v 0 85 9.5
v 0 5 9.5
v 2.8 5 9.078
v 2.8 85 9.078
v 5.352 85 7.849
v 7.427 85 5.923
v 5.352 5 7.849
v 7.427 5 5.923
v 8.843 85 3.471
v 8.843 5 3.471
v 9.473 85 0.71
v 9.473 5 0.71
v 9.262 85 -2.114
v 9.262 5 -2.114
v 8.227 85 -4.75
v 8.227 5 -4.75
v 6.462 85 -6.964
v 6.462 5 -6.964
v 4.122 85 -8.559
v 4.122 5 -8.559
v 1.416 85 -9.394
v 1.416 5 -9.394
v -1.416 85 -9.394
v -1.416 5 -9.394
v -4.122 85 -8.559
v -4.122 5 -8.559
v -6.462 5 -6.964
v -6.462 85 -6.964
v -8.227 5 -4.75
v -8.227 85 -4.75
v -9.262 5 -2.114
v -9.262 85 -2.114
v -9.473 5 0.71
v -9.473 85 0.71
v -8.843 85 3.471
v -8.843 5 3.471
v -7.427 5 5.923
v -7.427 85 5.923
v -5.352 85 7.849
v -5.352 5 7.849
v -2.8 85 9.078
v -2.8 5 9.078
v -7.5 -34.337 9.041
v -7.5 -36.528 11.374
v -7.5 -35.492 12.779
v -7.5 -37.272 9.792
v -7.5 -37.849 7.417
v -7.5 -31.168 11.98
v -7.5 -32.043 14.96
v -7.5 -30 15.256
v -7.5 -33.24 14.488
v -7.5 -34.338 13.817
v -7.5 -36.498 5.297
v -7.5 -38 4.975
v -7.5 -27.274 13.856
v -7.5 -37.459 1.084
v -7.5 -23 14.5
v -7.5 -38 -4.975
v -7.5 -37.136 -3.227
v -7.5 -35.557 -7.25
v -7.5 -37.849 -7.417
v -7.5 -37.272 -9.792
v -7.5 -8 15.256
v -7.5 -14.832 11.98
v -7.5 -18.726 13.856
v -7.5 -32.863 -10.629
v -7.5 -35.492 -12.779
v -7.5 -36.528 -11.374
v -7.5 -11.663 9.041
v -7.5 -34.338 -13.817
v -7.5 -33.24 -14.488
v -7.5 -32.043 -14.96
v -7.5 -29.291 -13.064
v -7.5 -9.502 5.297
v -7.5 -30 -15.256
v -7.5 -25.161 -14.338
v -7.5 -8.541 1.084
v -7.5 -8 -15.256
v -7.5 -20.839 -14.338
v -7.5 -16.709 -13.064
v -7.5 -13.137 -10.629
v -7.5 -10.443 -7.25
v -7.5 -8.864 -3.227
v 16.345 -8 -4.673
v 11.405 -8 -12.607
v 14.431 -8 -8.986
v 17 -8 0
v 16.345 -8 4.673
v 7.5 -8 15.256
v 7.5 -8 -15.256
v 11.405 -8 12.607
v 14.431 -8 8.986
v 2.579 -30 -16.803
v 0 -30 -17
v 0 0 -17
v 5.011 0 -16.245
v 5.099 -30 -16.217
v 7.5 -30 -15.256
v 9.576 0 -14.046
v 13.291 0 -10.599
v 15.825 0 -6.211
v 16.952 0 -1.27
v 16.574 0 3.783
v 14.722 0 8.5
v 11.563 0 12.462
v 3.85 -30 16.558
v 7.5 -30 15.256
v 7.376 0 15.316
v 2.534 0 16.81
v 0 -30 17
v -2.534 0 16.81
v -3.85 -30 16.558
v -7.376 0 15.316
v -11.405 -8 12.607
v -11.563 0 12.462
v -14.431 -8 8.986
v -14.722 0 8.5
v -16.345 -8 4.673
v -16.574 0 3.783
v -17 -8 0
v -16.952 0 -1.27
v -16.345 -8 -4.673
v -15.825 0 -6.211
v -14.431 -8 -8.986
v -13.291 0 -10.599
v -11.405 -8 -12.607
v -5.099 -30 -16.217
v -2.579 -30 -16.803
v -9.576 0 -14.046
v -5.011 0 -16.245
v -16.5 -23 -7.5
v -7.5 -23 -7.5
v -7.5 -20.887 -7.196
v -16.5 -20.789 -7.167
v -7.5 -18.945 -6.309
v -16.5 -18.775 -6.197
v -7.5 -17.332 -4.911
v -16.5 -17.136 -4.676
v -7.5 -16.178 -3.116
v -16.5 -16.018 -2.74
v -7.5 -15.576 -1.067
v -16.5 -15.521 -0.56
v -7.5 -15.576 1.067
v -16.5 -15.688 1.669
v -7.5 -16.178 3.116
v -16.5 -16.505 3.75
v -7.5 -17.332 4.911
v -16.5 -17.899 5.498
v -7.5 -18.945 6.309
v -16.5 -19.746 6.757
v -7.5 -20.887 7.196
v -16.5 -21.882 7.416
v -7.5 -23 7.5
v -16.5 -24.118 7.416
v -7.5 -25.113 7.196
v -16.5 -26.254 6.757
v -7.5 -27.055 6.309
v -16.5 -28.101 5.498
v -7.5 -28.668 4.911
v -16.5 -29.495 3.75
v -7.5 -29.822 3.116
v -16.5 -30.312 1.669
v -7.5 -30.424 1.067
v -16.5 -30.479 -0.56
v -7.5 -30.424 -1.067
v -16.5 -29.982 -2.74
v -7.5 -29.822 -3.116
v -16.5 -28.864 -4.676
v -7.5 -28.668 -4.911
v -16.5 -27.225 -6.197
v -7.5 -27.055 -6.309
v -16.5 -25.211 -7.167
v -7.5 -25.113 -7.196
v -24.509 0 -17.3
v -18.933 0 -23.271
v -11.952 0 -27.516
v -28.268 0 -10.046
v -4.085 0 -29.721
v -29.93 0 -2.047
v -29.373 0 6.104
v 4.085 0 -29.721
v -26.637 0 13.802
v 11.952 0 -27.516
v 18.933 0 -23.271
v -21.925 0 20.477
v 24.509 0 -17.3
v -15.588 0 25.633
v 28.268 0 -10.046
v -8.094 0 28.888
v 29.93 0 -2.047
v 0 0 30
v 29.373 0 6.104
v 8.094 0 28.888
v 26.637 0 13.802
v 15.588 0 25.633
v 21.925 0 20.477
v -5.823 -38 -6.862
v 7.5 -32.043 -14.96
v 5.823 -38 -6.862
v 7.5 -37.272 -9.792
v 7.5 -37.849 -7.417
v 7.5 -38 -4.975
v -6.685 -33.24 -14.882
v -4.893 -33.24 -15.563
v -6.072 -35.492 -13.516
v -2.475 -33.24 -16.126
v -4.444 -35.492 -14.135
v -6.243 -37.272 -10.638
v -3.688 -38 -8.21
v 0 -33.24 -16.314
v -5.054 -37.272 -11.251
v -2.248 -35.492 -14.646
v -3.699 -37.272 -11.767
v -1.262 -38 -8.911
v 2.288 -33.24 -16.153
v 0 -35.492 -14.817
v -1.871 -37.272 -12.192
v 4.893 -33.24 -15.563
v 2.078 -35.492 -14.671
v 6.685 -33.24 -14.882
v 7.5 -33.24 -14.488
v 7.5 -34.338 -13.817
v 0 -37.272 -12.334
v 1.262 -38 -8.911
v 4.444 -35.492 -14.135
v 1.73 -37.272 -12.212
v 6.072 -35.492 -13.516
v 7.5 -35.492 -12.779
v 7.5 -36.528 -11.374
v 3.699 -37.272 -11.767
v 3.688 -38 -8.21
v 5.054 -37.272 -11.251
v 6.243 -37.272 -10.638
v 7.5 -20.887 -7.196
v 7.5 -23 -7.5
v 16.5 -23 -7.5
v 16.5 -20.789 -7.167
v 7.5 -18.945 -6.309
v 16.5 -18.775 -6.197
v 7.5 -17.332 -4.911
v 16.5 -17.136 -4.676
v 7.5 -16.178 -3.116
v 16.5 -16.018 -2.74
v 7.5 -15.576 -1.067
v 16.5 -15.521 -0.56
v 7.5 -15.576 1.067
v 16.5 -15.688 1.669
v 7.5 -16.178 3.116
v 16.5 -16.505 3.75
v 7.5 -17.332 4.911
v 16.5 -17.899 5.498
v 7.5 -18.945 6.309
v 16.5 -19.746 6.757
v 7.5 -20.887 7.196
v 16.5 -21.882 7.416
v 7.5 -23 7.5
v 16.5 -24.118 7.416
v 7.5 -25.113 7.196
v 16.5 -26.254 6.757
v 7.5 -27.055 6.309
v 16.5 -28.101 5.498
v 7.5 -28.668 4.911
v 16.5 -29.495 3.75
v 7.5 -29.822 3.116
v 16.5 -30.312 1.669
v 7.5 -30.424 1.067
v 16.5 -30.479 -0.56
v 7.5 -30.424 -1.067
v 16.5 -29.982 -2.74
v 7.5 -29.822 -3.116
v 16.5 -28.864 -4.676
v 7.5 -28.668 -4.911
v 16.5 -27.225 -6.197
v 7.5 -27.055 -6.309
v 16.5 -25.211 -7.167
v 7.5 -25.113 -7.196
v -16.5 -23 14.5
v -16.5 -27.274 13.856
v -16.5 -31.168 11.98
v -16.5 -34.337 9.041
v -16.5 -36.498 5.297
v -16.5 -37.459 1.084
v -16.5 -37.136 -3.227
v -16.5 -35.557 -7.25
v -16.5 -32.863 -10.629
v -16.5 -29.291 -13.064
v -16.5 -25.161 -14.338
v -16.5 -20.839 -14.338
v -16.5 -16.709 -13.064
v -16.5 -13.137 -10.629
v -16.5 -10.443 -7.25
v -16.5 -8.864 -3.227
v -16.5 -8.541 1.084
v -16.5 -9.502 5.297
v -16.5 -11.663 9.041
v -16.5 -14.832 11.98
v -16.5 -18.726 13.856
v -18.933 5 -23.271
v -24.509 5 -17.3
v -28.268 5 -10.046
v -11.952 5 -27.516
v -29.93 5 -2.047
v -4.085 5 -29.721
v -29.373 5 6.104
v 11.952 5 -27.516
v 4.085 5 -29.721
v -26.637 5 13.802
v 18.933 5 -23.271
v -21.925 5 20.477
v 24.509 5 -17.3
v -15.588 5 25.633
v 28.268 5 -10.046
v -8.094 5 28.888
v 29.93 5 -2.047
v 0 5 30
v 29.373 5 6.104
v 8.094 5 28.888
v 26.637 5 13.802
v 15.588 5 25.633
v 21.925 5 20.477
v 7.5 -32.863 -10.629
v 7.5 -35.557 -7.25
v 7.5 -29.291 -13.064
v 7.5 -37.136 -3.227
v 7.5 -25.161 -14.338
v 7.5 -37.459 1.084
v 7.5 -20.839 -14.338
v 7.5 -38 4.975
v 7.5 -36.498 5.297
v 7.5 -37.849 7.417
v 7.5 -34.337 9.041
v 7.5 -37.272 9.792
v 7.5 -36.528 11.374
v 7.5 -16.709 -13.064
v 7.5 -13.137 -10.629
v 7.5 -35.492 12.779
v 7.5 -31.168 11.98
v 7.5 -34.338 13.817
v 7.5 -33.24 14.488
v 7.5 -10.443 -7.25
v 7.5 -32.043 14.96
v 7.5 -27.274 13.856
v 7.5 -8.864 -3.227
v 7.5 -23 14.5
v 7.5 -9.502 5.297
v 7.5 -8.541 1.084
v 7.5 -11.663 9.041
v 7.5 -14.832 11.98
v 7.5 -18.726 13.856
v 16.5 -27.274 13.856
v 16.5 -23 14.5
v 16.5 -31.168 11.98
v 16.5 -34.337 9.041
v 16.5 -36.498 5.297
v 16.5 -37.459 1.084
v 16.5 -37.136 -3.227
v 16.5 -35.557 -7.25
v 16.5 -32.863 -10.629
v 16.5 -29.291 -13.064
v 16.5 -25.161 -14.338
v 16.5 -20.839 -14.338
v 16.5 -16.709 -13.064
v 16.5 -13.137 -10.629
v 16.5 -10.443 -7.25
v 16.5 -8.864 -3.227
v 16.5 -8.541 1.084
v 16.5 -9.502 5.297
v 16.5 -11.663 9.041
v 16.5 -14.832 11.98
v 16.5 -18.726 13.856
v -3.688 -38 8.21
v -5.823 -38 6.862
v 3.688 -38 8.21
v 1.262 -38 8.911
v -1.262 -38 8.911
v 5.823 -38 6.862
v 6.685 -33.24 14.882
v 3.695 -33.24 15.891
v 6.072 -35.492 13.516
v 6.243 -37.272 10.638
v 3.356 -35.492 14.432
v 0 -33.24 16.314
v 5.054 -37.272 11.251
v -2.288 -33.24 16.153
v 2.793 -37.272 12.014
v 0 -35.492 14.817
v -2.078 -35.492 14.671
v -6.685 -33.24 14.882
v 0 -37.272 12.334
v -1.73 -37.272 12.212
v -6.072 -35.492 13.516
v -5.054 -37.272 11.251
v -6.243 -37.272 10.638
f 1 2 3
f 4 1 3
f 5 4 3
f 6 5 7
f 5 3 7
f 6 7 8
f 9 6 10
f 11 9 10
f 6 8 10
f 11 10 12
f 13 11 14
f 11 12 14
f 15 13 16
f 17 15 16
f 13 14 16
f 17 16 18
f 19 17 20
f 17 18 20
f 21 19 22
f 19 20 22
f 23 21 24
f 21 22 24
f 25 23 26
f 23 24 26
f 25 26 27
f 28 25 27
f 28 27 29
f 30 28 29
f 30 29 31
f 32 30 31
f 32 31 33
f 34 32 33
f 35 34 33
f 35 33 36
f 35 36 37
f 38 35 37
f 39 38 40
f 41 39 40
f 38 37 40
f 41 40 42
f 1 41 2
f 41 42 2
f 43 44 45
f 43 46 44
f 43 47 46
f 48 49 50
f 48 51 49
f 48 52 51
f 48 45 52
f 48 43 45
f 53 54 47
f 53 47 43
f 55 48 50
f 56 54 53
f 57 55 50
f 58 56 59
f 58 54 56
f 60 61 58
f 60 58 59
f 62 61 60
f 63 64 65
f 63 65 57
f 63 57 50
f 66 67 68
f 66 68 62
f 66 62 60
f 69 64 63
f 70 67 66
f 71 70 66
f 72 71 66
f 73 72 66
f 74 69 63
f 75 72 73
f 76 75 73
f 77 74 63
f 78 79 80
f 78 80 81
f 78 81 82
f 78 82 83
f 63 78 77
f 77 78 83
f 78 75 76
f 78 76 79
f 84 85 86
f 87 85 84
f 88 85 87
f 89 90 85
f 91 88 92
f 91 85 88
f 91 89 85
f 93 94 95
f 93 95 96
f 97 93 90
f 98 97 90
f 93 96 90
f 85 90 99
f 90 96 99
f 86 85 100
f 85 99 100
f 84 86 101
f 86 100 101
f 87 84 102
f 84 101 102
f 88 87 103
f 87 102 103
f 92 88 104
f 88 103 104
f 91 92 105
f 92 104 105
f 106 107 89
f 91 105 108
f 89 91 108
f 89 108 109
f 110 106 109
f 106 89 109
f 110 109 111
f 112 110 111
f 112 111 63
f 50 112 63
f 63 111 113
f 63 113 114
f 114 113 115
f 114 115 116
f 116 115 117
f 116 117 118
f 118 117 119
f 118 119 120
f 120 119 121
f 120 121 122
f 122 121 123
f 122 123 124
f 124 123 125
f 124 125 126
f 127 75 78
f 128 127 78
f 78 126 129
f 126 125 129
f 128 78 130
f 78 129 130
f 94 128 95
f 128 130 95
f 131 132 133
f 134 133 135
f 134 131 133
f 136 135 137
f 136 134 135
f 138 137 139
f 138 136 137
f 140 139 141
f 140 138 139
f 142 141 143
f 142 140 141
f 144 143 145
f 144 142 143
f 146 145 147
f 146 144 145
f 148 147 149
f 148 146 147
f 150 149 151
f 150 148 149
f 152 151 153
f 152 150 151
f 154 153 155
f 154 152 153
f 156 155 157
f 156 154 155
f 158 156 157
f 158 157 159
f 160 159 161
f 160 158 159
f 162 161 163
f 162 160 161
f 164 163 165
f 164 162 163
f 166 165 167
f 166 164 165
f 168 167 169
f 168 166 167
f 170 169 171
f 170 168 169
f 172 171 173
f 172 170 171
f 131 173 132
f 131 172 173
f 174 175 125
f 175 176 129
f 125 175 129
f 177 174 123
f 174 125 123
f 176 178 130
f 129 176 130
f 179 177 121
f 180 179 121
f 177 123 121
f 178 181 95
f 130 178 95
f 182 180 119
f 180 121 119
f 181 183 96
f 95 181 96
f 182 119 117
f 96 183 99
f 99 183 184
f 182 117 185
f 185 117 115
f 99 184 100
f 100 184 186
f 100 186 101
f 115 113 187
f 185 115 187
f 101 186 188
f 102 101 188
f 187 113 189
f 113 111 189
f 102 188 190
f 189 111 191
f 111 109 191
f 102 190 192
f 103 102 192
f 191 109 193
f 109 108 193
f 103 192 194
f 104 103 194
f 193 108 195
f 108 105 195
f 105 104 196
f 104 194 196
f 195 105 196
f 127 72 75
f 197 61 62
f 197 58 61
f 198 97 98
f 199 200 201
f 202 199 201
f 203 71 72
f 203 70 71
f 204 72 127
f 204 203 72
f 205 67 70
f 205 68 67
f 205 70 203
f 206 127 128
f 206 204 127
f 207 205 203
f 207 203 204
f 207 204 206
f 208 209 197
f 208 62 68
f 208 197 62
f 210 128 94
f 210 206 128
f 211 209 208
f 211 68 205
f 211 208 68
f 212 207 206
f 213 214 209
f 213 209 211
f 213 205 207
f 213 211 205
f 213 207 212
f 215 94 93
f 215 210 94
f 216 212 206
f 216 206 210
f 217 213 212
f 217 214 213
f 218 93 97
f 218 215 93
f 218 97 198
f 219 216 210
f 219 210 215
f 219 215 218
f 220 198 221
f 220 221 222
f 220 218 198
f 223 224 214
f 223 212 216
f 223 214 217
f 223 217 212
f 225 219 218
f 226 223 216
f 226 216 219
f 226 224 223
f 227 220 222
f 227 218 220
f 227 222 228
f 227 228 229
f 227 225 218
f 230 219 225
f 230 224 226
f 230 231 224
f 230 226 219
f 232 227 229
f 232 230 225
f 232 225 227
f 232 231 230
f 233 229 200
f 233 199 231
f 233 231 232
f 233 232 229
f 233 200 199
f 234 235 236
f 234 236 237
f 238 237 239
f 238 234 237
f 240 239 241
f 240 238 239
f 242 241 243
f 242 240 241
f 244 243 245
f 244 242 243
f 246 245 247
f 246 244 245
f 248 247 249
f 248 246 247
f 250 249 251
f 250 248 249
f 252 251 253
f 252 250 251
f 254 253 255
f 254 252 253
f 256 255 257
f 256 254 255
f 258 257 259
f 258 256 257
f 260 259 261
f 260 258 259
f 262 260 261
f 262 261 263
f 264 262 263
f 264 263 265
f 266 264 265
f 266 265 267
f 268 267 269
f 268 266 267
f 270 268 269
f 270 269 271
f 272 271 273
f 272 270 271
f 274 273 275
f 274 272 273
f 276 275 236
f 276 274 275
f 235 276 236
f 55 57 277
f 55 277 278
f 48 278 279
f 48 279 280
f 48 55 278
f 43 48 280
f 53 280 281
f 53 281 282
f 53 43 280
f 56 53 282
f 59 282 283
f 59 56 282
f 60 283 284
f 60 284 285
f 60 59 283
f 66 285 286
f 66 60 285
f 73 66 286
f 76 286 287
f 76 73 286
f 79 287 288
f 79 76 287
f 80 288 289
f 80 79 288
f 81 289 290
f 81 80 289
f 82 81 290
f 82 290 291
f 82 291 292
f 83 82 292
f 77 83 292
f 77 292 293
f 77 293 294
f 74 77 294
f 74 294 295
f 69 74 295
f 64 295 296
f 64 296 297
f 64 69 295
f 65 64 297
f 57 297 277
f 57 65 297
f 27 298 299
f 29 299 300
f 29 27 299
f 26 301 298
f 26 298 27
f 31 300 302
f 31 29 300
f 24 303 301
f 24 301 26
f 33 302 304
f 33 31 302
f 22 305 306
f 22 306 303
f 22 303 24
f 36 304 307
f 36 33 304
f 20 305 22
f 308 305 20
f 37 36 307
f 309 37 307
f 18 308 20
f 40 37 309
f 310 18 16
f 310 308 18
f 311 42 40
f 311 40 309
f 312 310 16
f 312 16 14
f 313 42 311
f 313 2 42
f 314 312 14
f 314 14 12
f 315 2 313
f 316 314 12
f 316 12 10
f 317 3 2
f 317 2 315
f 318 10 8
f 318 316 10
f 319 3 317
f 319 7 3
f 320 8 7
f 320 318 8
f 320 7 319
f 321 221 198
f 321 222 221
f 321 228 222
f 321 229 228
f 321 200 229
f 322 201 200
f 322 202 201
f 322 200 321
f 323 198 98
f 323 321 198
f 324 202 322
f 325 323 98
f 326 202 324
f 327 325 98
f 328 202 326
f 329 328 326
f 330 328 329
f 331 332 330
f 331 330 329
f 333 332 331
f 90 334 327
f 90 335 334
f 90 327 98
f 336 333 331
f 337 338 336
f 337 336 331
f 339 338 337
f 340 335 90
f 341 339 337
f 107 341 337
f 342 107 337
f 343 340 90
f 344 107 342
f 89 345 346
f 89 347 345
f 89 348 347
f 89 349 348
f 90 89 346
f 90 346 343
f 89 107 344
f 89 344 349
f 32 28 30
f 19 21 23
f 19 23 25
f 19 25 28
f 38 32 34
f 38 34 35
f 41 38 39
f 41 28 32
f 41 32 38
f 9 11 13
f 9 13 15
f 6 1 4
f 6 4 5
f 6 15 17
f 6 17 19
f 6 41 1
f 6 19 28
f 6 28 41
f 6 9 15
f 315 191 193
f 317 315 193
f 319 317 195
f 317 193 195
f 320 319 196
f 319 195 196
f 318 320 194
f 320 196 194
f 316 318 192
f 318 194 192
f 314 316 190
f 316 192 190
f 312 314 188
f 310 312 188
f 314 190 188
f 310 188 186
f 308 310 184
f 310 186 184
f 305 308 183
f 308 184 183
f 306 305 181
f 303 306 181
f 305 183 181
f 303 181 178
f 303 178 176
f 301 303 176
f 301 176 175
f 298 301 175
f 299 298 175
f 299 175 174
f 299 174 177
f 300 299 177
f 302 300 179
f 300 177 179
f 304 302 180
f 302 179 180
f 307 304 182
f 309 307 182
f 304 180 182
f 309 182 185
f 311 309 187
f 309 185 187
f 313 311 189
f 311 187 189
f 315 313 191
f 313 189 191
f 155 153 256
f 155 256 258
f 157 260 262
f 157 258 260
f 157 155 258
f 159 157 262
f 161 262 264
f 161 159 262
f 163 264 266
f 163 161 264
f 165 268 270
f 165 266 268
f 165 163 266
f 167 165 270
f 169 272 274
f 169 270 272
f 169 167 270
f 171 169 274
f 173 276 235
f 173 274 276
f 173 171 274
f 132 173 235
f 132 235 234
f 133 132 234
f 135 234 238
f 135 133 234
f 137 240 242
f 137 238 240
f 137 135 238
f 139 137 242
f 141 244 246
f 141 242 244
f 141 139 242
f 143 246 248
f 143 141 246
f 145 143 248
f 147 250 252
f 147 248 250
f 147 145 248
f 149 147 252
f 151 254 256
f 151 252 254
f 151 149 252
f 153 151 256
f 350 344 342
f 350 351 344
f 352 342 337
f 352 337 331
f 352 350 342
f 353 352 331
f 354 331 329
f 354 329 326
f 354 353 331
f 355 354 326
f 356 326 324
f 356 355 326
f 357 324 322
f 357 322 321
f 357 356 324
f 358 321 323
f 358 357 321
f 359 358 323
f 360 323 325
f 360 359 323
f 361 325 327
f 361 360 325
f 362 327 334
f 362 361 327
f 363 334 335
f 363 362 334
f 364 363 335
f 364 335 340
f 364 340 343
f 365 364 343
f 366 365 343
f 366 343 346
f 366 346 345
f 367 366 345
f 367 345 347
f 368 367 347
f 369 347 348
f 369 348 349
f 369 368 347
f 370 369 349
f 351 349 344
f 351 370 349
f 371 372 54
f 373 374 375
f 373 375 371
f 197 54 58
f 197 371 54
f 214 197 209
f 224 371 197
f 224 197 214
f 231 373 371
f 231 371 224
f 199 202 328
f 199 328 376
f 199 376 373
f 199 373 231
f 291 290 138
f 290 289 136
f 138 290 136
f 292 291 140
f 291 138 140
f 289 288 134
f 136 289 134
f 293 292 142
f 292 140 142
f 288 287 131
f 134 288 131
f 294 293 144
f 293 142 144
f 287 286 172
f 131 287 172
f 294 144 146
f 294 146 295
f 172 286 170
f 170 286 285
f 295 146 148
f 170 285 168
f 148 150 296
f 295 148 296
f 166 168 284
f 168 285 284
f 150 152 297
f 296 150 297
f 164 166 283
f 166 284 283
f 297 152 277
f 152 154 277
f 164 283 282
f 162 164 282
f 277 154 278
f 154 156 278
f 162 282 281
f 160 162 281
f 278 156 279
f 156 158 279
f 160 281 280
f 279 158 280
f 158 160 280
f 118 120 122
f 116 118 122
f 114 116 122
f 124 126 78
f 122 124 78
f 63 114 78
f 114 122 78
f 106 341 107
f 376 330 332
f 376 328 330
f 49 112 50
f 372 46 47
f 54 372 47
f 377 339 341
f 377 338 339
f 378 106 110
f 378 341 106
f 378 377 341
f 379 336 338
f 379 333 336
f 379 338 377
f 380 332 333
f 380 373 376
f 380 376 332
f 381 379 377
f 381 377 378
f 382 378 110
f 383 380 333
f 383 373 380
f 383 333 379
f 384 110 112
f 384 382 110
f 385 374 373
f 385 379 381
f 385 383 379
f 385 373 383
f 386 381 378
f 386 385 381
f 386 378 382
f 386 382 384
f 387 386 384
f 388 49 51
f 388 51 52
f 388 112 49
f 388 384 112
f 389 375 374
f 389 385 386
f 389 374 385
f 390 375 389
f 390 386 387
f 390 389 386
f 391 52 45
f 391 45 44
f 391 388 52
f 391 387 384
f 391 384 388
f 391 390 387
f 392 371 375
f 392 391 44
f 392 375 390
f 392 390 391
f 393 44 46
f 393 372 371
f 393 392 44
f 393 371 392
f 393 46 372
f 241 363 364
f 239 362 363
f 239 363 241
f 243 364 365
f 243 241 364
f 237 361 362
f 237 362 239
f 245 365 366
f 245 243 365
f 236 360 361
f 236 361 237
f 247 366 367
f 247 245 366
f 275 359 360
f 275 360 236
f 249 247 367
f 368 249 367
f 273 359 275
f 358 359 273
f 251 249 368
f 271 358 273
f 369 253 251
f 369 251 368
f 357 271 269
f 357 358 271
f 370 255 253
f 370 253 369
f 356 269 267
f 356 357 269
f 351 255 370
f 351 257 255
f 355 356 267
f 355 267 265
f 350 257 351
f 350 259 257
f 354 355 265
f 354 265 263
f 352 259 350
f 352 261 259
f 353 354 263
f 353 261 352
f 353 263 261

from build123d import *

# Parameters (mm, degrees)
SKETCH1_R               = 30
BOSS_EXTRUDE1_DEPTH     = 5
SKETCH2_R               = 9.5
BOSS_EXTRUDE2_DEPTH     = 80
SKETCH3_R               = 17
BOSS_EXTRUDE3_DEPTH     = 38
FILLET1_R               = 8
SKETCH4_W               = 21.418583827
SKETCH4_H               = 30
CUT_EXTRUDE1_DEPTH      = 19
CUT_EXTRUDE2_DEPTH      = 98.628120949
CUT_EXTRUDE2_DEPTH_BACK = 98.628120949
SKETCH8_R               = 7.5
SKETCH9_R               = 14.5
SKETCH9_R_2             = 7.5
BOSS_EXTRUDE4_DEPTH     = 16.5


with BuildPart() as part:
    # Sketch1 → Boss-Extrude1 (new body)
    with BuildSketch(Plane(origin=(0, 0, 0), x_dir=(1, 0, 0), z_dir=(0, 1, 0))):
        with Locations(Location((0, 0, 0), (0, 0, 270))):
            Circle(SKETCH1_R)
    extrude(amount=BOSS_EXTRUDE1_DEPTH)

    # Sketch2 → Boss-Extrude2 (add)
    with BuildSketch(Plane(origin=(0, 5, 0), x_dir=(1, 0, 0), z_dir=(0, 1, 0))):
        with Locations(Location((0, 0, 0), (0, 0, 270))):
            Circle(SKETCH2_R)
    extrude(amount=BOSS_EXTRUDE2_DEPTH)

    # Sketch3 → Boss-Extrude3 (add)
    with BuildSketch(Plane.XZ):
        with Locations(Location((0, 0, 0), (0, 0, 270))):
            Circle(SKETCH3_R)
    extrude(amount=BOSS_EXTRUDE3_DEPTH)

    # Fillet1
    fillet1_edges = [part.edges().sort_by_distance(p)[0] for p in [
        (0, -38, 17),
    ]]
    fillet(fillet1_edges, radius=FILLET1_R)

    # Sketch4 → Cut-Extrude1 (cut, symmetric)
    with BuildSketch(Plane.XY):
        with Locations((-18.209291914, -23)):
            Rectangle(SKETCH4_W, SKETCH4_H)
        with Locations((18.209291914, -23)):
            Rectangle(SKETCH4_W, SKETCH4_H)
    extrude(amount=CUT_EXTRUDE1_DEPTH, both=True, mode=Mode.SUBTRACT)

    # Sketch8 → Cut-Extrude2 (cut, two sides: drawn at the far end of the back side and taken through both)
    with BuildSketch(Plane(origin=(7.5, 0, 0), x_dir=(0, 0, -1), z_dir=(1, 0, 0)).offset(-CUT_EXTRUDE2_DEPTH_BACK)):
        with Locations(Location((0, -23, 0), (0, 0, 180))):
            Circle(SKETCH8_R)
    extrude(amount=CUT_EXTRUDE2_DEPTH + CUT_EXTRUDE2_DEPTH_BACK, mode=Mode.SUBTRACT)

    # Sketch9 → Boss-Extrude4 (add, symmetric)
    with BuildSketch(Plane(origin=(0, 0, 0), x_dir=(0, 0, -1), z_dir=(1, 0, 0))):
        with Locations(Location((0, -23, 0), (0, 0, 180))):
            Circle(SKETCH9_R)
        with Locations((0, -23)):
            Circle(SKETCH9_R_2, mode=Mode.SUBTRACT)
    extrude(amount=BOSS_EXTRUDE4_DEPTH, both=True)


solid = part.part
